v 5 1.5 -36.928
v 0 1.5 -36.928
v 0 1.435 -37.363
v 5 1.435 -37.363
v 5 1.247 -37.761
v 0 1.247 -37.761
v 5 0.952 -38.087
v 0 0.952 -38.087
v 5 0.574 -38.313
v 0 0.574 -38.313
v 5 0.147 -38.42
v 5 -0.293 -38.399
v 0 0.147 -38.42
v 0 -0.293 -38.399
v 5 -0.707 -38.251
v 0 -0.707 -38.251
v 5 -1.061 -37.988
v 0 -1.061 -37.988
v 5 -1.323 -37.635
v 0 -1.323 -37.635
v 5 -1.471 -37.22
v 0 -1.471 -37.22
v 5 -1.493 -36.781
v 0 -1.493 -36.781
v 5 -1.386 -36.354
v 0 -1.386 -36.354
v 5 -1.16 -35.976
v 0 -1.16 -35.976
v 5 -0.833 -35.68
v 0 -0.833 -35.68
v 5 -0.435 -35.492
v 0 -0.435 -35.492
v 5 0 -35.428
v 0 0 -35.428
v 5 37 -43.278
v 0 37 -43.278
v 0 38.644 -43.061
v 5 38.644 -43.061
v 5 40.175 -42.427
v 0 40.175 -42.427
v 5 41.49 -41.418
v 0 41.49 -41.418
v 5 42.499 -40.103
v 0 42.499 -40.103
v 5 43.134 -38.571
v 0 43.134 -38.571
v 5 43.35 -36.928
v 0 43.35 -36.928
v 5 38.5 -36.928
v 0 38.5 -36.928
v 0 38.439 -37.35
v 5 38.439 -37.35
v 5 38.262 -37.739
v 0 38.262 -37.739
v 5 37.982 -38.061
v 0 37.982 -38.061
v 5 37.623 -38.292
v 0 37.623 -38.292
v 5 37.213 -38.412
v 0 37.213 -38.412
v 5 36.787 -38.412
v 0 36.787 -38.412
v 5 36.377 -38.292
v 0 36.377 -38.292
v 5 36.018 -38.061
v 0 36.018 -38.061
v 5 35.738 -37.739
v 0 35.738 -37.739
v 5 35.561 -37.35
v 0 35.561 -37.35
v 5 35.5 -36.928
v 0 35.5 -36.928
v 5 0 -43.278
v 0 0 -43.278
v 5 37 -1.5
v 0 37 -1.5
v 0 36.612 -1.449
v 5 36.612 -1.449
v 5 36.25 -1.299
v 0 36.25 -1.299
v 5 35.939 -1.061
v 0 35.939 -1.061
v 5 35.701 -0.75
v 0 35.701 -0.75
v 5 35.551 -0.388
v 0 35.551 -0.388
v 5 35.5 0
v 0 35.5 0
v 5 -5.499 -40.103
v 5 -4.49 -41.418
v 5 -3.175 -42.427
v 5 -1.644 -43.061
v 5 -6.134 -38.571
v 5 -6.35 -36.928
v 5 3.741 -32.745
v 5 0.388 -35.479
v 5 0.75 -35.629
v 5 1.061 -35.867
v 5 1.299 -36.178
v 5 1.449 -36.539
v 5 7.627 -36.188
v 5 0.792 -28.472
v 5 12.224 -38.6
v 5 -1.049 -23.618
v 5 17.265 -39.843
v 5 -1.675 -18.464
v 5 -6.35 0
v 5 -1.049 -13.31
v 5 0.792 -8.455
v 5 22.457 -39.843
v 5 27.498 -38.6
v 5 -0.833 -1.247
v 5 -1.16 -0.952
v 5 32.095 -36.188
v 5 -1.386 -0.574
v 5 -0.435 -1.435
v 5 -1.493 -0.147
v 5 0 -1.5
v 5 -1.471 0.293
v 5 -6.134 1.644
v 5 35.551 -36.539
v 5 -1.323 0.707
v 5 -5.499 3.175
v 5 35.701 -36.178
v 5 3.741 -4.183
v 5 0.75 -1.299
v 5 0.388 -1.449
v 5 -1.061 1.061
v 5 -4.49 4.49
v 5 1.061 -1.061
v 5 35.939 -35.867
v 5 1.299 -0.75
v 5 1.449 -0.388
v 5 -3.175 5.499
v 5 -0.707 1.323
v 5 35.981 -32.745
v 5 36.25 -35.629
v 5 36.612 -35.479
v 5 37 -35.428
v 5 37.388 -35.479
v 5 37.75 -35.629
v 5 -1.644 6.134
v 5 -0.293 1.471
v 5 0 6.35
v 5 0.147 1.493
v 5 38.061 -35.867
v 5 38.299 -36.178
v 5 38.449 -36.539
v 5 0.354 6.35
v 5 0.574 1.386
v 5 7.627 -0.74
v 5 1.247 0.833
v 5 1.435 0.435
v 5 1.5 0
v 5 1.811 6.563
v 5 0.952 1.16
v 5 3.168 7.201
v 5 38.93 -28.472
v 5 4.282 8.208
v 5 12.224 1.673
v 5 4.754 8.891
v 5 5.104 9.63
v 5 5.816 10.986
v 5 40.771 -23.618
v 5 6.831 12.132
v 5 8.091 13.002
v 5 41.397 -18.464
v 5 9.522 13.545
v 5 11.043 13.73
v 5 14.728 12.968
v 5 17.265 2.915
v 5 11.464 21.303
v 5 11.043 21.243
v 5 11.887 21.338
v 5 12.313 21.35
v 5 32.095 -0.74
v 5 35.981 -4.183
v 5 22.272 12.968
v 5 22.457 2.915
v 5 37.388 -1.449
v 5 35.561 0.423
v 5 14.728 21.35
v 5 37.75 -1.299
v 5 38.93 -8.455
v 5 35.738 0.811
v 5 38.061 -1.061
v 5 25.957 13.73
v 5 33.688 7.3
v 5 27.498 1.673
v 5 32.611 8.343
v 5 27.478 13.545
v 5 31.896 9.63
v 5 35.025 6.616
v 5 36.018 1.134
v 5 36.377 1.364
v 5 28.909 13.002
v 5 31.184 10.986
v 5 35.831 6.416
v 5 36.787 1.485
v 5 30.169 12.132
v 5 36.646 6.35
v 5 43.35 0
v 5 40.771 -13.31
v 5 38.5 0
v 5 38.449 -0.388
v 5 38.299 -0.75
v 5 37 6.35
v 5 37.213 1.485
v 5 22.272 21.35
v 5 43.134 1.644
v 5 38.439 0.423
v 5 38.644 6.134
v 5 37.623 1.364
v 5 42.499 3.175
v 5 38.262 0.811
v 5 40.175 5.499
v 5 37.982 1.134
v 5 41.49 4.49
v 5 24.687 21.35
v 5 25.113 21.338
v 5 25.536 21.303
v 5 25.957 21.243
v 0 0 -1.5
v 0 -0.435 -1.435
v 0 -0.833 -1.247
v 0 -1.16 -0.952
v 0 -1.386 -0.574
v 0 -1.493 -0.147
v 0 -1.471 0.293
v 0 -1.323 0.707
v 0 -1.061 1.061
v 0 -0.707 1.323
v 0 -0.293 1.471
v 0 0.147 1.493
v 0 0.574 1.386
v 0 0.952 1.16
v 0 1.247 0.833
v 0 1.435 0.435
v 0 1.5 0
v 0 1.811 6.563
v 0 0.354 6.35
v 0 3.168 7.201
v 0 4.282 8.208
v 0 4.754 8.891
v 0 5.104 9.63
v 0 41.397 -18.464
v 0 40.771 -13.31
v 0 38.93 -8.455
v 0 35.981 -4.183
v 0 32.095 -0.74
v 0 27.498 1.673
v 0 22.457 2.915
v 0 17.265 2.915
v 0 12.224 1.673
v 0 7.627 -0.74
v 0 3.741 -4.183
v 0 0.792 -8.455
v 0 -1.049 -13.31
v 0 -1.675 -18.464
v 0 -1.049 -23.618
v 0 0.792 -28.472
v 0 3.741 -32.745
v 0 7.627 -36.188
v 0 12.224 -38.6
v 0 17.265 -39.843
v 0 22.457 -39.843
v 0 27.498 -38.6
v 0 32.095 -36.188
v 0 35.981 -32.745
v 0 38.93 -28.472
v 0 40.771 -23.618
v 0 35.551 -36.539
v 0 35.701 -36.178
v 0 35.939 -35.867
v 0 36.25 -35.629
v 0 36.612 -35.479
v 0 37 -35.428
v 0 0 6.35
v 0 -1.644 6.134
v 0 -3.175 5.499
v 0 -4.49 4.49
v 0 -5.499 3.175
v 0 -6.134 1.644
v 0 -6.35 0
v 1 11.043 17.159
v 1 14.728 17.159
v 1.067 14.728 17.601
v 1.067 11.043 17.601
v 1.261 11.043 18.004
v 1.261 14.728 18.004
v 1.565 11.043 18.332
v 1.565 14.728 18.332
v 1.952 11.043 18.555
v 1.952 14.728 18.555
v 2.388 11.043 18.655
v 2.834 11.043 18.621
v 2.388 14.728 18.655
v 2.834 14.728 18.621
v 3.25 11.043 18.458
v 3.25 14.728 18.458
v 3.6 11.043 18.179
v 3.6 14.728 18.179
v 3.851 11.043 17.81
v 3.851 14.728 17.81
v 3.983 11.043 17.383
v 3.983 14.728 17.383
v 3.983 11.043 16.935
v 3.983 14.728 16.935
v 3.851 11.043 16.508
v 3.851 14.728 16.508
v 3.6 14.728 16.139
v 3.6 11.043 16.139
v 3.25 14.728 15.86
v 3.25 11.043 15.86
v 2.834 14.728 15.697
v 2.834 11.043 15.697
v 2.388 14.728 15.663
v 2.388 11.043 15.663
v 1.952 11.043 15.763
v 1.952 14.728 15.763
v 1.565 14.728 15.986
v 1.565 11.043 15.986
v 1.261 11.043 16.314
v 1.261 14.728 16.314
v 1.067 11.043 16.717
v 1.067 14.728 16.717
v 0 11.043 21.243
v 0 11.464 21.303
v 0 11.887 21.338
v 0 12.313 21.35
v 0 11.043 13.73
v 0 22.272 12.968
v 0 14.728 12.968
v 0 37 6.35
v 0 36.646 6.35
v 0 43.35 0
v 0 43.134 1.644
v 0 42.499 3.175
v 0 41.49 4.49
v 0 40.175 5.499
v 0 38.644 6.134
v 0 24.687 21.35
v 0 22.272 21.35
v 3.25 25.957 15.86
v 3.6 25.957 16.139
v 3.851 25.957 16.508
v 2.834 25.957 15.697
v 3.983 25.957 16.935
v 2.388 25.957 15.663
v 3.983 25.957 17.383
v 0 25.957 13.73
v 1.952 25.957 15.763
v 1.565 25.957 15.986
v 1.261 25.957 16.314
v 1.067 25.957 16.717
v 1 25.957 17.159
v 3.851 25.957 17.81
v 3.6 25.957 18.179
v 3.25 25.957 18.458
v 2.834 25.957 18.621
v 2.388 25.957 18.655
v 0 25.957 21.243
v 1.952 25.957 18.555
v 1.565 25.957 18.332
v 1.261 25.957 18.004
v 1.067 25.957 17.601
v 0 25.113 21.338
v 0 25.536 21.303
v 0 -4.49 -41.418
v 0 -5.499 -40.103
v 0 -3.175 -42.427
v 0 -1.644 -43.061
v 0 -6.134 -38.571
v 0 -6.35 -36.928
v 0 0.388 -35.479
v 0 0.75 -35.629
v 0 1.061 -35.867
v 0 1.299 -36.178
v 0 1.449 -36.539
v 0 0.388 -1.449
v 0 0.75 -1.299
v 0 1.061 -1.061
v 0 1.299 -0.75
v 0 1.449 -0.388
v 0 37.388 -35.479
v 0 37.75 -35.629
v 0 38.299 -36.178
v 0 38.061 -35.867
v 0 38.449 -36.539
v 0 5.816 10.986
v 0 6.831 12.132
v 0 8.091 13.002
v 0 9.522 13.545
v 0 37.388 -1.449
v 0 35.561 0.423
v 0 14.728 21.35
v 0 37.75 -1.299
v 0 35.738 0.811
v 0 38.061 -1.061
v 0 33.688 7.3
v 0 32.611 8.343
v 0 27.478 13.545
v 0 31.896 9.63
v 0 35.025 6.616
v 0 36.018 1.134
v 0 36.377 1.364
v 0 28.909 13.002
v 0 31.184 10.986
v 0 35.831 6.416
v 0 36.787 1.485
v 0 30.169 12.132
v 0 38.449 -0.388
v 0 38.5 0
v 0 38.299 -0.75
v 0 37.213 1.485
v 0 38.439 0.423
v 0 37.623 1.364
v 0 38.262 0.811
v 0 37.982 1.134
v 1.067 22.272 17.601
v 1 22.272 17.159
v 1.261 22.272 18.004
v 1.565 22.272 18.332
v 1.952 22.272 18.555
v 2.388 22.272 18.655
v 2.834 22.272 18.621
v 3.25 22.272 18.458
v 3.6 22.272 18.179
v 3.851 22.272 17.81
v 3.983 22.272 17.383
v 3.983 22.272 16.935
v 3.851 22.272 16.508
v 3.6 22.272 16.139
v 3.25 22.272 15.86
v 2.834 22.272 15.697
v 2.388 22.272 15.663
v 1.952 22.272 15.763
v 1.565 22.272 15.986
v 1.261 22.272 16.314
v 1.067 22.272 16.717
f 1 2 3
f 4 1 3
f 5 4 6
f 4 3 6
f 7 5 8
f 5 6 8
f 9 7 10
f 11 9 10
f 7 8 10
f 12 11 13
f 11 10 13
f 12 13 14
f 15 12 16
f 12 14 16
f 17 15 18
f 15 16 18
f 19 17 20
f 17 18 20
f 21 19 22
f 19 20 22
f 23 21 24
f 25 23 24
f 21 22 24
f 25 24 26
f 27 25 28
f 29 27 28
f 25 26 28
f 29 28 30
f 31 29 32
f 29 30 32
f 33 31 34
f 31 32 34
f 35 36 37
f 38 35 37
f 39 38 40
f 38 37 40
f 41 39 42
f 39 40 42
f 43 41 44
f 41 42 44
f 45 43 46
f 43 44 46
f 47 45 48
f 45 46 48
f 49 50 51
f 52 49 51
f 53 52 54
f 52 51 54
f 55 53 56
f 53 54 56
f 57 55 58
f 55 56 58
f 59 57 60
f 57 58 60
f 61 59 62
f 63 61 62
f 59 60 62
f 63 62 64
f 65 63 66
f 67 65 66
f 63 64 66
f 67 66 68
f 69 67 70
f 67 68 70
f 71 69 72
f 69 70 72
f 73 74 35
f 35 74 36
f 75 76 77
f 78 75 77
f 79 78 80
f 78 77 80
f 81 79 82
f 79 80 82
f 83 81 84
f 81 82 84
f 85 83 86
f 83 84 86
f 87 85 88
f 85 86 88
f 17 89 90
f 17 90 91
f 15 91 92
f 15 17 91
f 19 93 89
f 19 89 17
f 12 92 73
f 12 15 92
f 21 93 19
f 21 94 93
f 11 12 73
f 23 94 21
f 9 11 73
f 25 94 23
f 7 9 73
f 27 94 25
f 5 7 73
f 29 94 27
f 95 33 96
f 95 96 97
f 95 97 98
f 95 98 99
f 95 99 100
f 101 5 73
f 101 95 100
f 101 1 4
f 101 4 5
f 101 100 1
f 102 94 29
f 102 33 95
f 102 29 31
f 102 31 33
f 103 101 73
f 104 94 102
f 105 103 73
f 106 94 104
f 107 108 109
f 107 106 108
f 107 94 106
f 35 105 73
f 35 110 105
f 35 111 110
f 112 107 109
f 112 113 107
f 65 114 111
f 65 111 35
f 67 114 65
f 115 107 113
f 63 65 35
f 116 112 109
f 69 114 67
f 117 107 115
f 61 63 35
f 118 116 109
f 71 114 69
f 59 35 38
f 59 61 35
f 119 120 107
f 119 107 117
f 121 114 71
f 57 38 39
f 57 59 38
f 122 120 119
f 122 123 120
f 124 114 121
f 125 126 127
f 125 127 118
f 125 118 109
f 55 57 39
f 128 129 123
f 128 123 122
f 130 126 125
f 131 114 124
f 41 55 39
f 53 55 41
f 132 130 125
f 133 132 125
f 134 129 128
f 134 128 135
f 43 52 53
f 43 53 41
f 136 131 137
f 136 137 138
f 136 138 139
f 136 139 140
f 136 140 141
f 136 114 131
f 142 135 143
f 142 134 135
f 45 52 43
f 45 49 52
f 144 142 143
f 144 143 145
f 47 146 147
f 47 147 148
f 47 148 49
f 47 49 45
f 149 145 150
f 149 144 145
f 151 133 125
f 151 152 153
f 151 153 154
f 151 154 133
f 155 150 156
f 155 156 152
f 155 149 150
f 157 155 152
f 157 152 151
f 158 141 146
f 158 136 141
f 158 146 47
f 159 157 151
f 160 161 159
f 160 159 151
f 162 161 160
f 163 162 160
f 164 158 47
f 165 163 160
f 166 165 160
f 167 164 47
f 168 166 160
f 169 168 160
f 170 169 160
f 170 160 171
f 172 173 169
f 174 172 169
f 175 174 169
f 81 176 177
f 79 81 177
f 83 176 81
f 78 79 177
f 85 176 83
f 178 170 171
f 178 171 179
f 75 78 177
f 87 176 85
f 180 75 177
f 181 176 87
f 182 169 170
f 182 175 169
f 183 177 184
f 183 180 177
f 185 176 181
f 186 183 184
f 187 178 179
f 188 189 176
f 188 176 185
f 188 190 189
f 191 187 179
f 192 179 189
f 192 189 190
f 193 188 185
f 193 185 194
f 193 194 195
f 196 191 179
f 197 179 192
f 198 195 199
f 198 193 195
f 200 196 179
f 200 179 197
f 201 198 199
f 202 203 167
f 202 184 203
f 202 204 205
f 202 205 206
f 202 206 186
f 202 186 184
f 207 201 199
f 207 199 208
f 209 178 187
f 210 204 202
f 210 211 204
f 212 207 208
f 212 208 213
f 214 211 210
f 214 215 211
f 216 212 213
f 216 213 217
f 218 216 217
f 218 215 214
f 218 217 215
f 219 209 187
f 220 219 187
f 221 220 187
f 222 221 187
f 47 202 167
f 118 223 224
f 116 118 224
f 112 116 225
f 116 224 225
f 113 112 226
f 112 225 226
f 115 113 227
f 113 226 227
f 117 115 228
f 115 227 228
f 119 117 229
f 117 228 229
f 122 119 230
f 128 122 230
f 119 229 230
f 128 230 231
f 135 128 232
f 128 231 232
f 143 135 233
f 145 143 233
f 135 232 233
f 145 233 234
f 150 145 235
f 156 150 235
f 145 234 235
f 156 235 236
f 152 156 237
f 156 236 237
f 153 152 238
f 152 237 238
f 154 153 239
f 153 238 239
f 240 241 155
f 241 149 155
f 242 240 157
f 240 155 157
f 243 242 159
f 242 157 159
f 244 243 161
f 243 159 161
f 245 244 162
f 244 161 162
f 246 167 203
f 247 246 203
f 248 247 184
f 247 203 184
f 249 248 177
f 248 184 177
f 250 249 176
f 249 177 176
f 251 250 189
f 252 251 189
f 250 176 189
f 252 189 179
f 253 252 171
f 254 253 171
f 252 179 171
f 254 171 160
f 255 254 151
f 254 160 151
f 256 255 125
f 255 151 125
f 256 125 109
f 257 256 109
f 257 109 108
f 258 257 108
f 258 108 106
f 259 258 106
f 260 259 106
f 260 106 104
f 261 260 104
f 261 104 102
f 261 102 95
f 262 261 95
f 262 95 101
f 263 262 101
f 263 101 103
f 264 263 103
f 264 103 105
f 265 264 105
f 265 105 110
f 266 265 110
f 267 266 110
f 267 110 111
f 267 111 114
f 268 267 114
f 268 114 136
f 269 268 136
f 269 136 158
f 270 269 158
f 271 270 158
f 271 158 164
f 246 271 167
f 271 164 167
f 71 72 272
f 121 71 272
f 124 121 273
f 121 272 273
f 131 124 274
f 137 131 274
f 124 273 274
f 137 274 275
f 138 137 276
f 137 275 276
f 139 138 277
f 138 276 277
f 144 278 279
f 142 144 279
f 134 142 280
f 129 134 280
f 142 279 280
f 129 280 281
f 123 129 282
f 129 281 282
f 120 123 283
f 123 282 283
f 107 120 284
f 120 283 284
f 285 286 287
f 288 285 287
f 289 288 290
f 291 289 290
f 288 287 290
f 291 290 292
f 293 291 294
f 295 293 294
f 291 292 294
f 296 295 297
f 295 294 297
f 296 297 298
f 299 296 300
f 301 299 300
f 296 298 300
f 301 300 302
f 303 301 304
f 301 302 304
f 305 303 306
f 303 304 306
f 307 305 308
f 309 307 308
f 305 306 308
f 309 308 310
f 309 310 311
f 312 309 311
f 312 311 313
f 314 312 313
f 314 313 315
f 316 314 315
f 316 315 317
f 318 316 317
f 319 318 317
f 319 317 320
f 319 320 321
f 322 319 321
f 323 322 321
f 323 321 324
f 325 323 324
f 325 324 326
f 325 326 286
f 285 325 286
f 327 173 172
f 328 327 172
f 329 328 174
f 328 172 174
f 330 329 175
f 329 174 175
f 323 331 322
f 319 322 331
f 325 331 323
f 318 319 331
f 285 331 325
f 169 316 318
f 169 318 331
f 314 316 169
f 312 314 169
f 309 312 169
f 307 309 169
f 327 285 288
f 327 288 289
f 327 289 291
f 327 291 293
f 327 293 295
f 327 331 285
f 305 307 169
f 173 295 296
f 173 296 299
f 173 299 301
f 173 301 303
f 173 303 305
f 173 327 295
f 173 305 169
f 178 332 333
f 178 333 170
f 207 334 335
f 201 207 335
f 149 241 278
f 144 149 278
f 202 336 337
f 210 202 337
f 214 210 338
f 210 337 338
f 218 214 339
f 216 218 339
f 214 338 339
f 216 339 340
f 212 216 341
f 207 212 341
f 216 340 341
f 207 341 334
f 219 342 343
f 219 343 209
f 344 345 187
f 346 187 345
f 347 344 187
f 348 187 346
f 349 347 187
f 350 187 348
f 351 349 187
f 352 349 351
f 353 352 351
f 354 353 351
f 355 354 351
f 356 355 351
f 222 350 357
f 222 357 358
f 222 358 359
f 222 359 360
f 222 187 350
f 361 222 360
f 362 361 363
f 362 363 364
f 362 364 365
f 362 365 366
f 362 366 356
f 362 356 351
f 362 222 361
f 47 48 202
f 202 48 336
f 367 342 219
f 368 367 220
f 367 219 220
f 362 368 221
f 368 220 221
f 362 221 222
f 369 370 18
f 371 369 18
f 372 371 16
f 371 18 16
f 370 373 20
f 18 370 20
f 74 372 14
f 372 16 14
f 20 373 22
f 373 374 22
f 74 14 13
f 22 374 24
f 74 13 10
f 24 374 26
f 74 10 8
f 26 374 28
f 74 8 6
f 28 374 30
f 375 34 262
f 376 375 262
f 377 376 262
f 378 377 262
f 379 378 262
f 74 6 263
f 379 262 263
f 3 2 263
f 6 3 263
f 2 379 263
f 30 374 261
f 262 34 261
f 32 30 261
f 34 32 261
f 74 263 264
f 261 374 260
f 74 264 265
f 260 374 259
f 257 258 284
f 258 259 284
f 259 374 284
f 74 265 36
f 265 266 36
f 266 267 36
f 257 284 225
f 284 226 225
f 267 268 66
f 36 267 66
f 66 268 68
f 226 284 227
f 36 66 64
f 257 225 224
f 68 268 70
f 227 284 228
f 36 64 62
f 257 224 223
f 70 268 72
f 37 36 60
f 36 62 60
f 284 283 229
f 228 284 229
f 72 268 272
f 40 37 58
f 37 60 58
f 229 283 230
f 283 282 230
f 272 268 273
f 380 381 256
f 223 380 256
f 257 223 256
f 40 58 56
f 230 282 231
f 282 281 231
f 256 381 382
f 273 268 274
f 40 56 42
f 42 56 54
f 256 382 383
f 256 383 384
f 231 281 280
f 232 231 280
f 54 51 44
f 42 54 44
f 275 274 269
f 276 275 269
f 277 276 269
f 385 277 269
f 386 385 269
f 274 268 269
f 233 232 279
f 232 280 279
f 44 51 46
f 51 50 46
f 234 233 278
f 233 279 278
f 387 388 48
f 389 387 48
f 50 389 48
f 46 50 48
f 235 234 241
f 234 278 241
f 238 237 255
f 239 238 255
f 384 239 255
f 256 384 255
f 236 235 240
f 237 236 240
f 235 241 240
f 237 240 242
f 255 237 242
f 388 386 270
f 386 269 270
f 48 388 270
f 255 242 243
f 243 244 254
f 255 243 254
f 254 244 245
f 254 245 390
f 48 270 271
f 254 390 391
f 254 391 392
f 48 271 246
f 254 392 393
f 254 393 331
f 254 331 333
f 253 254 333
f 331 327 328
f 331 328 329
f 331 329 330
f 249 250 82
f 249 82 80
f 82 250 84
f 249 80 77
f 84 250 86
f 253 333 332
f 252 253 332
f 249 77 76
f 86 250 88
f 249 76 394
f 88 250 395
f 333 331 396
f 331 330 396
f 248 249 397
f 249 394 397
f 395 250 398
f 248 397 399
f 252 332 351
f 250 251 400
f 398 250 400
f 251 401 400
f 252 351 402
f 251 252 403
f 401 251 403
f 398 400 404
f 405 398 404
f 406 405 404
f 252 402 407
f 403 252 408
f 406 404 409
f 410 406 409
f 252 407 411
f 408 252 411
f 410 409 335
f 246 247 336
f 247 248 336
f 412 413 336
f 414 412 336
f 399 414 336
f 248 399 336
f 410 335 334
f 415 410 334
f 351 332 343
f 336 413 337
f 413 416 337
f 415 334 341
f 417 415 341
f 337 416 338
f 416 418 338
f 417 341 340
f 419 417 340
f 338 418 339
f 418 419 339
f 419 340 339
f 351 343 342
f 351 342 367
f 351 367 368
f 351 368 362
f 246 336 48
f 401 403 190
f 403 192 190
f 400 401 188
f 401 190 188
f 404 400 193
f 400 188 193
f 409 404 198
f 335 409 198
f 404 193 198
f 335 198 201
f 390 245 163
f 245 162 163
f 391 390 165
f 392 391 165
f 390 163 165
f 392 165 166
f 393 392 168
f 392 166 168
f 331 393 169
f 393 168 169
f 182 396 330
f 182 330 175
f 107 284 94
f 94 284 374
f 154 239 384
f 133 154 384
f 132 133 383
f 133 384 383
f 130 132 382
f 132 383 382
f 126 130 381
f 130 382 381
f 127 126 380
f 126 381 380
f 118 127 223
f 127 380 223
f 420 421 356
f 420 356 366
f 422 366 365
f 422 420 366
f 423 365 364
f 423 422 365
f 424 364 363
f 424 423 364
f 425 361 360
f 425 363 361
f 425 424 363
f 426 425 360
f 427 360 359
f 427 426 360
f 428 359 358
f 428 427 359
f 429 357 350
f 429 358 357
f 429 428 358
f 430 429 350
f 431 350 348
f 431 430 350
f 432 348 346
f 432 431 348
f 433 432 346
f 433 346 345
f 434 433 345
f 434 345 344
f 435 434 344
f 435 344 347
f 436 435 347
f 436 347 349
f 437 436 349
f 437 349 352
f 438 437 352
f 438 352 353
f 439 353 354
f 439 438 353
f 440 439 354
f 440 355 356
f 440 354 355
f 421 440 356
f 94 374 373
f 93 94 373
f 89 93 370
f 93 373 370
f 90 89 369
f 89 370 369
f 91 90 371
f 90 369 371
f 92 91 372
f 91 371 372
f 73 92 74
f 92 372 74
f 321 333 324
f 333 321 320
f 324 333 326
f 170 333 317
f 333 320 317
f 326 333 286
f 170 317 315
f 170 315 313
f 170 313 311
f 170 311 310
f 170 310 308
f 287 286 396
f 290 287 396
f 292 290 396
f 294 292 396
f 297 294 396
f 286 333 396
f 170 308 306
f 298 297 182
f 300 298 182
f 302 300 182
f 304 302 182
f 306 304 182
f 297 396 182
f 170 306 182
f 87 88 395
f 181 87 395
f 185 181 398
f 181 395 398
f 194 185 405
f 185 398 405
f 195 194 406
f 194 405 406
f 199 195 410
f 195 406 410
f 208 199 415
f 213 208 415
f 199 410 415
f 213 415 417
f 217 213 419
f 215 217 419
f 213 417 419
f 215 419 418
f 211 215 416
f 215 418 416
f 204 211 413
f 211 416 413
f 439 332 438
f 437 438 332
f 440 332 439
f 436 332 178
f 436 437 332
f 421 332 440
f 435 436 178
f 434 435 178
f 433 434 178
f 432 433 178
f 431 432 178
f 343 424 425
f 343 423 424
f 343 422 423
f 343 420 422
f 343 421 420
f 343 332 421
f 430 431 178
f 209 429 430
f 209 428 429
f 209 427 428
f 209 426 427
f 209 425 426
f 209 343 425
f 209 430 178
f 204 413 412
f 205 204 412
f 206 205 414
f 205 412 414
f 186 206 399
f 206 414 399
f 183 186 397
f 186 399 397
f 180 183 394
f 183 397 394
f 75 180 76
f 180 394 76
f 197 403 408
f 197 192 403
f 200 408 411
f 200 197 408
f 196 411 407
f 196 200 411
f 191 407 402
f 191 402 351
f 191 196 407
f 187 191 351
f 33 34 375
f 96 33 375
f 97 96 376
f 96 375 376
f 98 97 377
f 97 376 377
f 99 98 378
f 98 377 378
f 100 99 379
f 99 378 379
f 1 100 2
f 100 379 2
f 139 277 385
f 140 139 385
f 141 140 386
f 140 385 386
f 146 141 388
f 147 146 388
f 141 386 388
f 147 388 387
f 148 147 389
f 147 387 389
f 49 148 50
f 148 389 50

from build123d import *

# Parameters (mm, degrees)
F1_DEPTH       = 5
F2_R           = 21.536165151
F3_DEPTH       = 5.001
F4_W           = 5
F4_H           = 27.6149739623
F5_DEPTH       = 15
F6_R           = 7.62
F7_W           = 5
F7_H           = 7.544119532
F8_DEPTH       = 8.382
F9_R           = 1.5
F10_DEPTH      = 21.078940234
F10_DEPTH_BACK = 28.623059766
F11_W          = 7.3633623496
F11_H          = 12.0904415441
F12_DEPTH      = 6.35
F13_W          = 7.1302087698
F13_H          = 20.9519683909
F14_DEPTH      = 6.35
F15_R          = 6.34999
F16_R          = 5.08


# Not quite as in the source:
# - a fillet or chamfer is up to 0.001 mm smaller than in the source, because OpenCascade refuses the exact size


with BuildPart() as f1:
    # F0 (on Right) → F1 (new body)
    with BuildSketch(Plane.YZ):
        with BuildLine():
            ThreePointArc((0, 6.35), (-4.4901280605, 4.4901280605), (-6.35, 0))
            Line((-6.35, 0), (-6.35, -36.927669698))
            ThreePointArc((-6.35, -36.927669698), (-4.4901280605, -41.4177977585), (0, -43.277669698))
            Line((0, -43.277669698), (37, -43.277669698))
            ThreePointArc((37, -43.277669698), (41.4901280605, -41.4177977585), (43.35, -36.927669698))
            Line((43.35, -36.927669698), (43.35, 0))
            ThreePointArc((43.35, 0), (41.4901280605, 4.4901280605), (37, 6.35))
            Line((37, 6.35), (0, 6.35))
        make_face()
        with BuildLine():
            ThreePointArc((0, -1.5), (-1.0606601718, 1.0606601718), (1.5, 0))
            Line((1.5, 0), (35.5, 0))
            ThreePointArc((35.5, 0), (37, 1.5), (38.5, 0))
            ThreePointArc((38.5, 0), (38.0606601718, -1.0606601718), (37, -1.5))
            Line((37, -1.5), (37, -35.4276701232))
            ThreePointArc((37, -35.4276701232), (38.0606601718, -35.8670099514), (38.5, -36.9276701232))
            ThreePointArc((38.5, -36.9276701232), (37, -38.4276701232), (35.5, -36.9276701232))
            Line((35.5, -36.9276701232), (1.5, -36.9276701232))
            ThreePointArc((1.5, -36.9276701232), (-1.0606601718, -37.988330295), (0, -35.4276701232))
            Line((0, -35.4276701232), (0, -1.5))
        make_face(mode=Mode.SUBTRACT)
        with BuildLine():
            Line((35.5, 0), (1.5, 0))
            ThreePointArc((1.5, 0), (1.0606601718, -1.0606601718), (0, -1.5))
            Line((0, -1.5), (0, -35.4276701232))
            ThreePointArc((0, -35.4276701232), (1.0606601718, -35.8670099514), (1.5, -36.9276701232))
            Line((1.5, -36.9276701232), (35.5, -36.9276701232))
            ThreePointArc((35.5, -36.9276701232), (35.9393398282, -35.8670099514), (37, -35.4276701232))
            Line((37, -35.4276701232), (37, -1.5))
            ThreePointArc((37, -1.5), (35.9393398282, -1.0606601718), (35.5, 0))
        make_face()
    extrude(amount=F1_DEPTH)

    # F2 (on face) → F3 (cut, through all)
    with BuildSketch(Plane.YZ.offset(5)):
        with Locations((19.8611337692, -18.463834849)):
            Circle(F2_R)
    extrude(amount=-F3_DEPTH, mode=Mode.SUBTRACT)

    # F4 (on face) → F5 (join)
    with BuildSketch(Plane.XY.offset(6.35)):
        with Locations((2.5, 18.5)):
            Rectangle(F4_W, F4_H)
    extrude(amount=F5_DEPTH)

    # F6
    f6_edges = [f1.edges().sort_by_distance(p)[0] for p in [
        (2.5, 32.307487, 21.35),
        (2.5, 4.692513, 21.35),
    ]]
    fillet(f6_edges, radius=F6_R)

    # F7 (on face) → F8 (cut)
    with BuildSketch(Plane.XY.offset(21.35)):
        with Locations((2.5, 18.5)):
            Rectangle(F7_W, F7_H)
    extrude(amount=-F8_DEPTH, mode=Mode.SUBTRACT)

    # F9 (on face) → F10 (cut, two sides)
    with BuildSketch(Plane(origin=(0, 14.727940234, 0), x_dir=(-1, 0, 0), z_dir=(0, 1, 0))) as f10_sk:
        with Locations((-2.5, 17.159)):
            Circle(F9_R)
    extrude(amount=-F10_DEPTH, mode=Mode.SUBTRACT)
    extrude(f10_sk.sketch, amount=F10_DEPTH_BACK, mode=Mode.SUBTRACT)

    # F11 (on face) → F12 (cut)
    with BuildSketch(Plane(origin=(0, 32.3074869812, 0), x_dir=(-1, 0, 0), z_dir=(0, 1, 0))):
        with Locations((-1.3183188252, 19.775220772)):
            Rectangle(F11_W, F11_H)
    extrude(amount=-F12_DEPTH, mode=Mode.SUBTRACT)

    # F13 (on face) → F14 (cut)
    with BuildSketch(Plane.XZ.offset(-4.6925130188)):
        with Locations((1.4348956151, 24.2059841955)):
            Rectangle(F13_W, F13_H)
    extrude(amount=-F14_DEPTH, mode=Mode.SUBTRACT)

    # F15 (radius 6.35 in the source; OpenCascade refuses exactly that, so slightly less here)
    f15_edges = [f1.edges().sort_by_distance(p)[0] for p in [
        (2.5, 4.692513, 13.73),
        (2.5, 32.307487, 13.73),
    ]]
    fillet(f15_edges, radius=F15_R)

    # F16
    f16_edges = [f1.edges().sort_by_distance(p)[0] for p in [
        (2.5, 4.692513, 6.35),
        (2.5, 32.307487, 6.35),
    ]]
    fillet(f16_edges, radius=F16_R)


solid = f1.part
